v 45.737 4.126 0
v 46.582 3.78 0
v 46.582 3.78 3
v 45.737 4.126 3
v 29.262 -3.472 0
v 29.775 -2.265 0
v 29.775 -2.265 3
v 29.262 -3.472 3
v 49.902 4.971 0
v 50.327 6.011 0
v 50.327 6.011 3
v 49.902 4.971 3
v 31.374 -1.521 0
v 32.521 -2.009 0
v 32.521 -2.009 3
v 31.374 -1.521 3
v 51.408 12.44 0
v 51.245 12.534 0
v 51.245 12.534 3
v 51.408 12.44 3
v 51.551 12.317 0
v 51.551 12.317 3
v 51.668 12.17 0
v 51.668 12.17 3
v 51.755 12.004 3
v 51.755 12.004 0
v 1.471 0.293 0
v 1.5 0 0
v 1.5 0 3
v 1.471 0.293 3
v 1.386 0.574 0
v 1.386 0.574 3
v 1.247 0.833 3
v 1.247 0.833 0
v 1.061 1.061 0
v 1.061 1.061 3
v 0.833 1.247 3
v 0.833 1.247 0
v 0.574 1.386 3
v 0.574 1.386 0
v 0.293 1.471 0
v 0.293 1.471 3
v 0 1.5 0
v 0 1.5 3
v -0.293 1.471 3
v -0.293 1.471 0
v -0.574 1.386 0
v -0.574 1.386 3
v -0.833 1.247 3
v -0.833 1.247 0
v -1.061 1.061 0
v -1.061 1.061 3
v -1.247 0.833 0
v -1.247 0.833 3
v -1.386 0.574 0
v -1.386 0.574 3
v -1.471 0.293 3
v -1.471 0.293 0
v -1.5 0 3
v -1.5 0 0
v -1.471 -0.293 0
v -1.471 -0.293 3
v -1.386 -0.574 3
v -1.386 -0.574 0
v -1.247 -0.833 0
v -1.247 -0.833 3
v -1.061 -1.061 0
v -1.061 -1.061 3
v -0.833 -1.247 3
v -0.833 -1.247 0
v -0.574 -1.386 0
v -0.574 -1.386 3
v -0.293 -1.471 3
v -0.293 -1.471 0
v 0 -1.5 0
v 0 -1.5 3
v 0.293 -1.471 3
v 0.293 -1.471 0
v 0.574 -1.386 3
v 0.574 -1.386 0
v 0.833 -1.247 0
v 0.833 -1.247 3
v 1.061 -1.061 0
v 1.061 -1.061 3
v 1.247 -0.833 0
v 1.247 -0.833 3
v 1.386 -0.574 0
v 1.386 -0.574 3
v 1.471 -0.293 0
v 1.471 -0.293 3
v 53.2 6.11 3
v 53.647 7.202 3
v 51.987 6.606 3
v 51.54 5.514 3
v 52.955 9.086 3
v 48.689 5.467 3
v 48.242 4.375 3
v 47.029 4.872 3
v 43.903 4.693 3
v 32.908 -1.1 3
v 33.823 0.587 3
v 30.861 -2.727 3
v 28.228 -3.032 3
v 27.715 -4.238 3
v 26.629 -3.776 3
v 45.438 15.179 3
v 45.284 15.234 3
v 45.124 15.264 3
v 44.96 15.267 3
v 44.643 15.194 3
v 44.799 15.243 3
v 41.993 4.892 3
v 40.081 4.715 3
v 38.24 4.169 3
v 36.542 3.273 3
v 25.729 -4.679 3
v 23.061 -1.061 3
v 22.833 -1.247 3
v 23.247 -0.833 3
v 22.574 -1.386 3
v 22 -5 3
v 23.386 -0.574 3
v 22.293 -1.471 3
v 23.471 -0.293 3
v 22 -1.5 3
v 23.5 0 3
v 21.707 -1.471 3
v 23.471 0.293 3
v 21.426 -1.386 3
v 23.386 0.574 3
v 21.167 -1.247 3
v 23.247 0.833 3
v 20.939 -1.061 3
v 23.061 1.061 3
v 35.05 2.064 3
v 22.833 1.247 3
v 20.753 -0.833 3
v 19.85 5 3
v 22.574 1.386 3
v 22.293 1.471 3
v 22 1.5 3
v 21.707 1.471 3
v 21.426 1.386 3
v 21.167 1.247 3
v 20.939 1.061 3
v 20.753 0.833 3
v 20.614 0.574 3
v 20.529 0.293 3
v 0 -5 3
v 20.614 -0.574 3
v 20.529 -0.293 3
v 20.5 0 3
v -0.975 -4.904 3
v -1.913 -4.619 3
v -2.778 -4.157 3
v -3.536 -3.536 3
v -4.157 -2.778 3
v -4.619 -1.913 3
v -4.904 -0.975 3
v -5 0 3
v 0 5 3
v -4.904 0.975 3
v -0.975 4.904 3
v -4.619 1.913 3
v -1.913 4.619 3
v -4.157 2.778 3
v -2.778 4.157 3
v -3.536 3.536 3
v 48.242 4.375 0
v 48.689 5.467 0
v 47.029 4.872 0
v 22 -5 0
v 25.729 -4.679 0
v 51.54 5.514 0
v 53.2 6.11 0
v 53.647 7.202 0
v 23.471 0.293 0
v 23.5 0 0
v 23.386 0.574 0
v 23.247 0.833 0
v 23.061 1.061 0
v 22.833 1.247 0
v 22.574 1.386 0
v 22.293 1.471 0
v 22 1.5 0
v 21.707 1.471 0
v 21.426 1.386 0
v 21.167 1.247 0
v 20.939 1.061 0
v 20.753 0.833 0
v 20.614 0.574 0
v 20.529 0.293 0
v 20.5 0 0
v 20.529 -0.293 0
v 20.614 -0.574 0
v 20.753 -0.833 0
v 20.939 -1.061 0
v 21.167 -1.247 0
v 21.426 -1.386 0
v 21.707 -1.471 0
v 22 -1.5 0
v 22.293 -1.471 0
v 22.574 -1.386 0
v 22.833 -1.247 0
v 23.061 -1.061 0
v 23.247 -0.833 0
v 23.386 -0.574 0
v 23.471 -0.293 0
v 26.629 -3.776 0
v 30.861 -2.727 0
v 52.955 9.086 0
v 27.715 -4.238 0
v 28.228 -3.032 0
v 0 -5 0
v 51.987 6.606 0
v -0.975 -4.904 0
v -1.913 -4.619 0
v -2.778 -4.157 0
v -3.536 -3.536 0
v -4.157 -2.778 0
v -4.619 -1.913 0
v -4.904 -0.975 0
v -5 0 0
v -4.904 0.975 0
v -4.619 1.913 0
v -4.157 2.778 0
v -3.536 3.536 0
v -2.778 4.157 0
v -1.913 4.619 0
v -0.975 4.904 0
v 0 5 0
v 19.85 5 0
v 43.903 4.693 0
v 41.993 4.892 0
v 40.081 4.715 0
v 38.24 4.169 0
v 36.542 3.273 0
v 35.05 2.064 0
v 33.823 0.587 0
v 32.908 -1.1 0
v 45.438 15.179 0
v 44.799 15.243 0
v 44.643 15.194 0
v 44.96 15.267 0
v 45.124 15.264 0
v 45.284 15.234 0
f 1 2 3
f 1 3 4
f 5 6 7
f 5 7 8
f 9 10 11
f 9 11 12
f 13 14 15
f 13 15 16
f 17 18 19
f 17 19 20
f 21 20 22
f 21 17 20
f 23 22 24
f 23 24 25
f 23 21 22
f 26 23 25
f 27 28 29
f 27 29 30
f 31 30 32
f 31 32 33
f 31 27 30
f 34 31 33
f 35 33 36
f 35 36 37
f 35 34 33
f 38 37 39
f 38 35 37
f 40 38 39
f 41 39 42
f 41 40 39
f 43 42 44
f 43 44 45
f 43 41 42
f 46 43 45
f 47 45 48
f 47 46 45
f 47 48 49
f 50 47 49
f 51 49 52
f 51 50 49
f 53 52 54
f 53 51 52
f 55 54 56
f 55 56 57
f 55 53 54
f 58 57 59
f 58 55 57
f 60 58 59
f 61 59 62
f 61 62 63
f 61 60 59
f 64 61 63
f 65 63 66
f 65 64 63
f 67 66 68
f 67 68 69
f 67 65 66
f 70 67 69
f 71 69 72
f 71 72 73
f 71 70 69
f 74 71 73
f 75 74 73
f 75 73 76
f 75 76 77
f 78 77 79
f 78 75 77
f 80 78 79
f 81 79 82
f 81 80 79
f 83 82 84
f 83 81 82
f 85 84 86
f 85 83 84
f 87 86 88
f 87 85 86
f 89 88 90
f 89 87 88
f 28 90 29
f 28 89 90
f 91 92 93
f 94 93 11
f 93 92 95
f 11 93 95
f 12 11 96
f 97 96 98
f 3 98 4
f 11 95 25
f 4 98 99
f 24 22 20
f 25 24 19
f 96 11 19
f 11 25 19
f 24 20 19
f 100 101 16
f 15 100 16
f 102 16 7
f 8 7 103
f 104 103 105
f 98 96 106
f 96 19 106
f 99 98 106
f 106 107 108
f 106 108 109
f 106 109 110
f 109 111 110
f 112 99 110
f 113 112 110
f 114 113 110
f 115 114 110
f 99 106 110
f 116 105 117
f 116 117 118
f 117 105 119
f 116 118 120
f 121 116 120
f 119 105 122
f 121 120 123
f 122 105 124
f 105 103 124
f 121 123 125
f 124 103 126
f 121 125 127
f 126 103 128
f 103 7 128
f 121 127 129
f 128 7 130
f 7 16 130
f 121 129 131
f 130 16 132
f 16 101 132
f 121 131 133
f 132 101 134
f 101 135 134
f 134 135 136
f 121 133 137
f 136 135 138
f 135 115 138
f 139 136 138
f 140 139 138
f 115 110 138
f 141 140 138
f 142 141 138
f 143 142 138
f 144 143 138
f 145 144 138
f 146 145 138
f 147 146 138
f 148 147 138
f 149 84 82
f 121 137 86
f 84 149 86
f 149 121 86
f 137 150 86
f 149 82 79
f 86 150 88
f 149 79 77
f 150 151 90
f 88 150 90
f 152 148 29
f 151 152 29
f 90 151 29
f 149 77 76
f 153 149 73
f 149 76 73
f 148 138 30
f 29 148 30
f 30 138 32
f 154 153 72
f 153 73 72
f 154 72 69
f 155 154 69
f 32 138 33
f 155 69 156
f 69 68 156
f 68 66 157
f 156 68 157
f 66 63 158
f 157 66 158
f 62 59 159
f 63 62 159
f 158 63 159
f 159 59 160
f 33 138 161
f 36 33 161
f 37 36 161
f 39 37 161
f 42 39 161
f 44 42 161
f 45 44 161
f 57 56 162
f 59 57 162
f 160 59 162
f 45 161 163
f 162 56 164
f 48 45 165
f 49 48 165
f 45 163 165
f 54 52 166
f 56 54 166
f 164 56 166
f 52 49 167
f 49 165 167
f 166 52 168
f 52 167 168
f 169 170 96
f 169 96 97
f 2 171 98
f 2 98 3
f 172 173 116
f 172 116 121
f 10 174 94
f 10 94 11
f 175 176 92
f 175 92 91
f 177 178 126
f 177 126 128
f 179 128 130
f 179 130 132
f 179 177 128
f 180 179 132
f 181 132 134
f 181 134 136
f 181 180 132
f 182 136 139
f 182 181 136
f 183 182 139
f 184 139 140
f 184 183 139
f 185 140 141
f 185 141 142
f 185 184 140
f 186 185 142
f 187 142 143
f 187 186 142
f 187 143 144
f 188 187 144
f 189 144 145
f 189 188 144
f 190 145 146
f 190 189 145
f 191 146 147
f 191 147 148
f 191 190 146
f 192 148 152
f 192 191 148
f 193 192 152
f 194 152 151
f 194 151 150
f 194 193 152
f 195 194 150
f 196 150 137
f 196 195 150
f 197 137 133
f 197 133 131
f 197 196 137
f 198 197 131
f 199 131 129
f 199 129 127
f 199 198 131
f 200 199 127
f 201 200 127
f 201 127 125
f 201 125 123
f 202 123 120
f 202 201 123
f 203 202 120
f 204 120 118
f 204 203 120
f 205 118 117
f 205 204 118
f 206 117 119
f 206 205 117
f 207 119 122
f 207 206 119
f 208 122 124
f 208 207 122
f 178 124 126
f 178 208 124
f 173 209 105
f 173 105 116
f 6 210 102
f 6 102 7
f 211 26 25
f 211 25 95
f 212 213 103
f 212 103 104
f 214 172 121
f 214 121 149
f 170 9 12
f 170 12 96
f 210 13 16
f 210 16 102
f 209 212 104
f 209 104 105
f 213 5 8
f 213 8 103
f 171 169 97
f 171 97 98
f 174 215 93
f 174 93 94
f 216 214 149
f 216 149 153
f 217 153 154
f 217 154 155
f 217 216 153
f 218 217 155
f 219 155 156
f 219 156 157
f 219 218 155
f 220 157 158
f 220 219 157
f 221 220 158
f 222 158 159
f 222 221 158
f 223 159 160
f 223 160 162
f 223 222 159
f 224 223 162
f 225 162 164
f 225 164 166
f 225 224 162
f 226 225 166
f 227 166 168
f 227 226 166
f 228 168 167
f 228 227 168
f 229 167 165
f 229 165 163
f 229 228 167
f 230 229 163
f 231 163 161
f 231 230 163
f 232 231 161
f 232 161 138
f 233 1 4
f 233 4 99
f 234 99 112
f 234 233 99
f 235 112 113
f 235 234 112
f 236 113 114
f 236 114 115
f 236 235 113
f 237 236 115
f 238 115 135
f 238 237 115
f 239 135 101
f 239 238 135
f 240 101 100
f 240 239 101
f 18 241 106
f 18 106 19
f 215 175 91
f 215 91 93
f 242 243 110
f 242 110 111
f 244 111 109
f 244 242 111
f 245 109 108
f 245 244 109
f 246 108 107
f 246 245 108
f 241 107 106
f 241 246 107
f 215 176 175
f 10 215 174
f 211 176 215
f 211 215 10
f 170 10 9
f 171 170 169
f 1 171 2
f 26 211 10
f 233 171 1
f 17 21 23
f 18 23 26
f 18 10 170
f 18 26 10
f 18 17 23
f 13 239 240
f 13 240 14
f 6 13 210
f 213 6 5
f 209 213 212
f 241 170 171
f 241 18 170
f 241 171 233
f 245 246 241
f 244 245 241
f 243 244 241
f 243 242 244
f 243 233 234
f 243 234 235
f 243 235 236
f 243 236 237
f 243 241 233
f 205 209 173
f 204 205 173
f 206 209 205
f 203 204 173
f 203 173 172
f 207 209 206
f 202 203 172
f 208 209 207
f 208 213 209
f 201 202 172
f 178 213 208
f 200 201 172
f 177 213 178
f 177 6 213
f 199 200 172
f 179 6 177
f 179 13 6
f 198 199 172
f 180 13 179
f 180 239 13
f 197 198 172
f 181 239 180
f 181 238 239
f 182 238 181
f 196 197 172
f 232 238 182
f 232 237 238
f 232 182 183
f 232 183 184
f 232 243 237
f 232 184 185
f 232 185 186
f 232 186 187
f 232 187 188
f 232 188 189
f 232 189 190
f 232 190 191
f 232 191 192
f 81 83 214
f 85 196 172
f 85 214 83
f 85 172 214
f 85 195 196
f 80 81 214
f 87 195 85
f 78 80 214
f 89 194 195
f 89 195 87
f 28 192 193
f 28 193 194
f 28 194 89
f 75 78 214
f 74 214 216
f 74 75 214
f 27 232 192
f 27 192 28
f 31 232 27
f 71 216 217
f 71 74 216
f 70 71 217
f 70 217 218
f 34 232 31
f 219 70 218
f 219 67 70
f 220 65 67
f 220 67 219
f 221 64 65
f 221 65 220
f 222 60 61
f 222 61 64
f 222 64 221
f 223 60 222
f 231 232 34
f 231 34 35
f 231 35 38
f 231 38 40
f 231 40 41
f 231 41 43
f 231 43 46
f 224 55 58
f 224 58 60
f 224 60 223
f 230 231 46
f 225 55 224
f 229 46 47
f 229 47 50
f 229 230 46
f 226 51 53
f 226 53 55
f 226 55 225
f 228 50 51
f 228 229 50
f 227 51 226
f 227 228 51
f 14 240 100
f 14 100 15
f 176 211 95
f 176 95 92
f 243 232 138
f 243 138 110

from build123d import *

# Parameters (mm, degrees)
SKETCH1_R           = 1.5
BOSS_EXTRUDE1_DEPTH = 3


with BuildPart() as part:
    # Sketch1 → Boss-Extrude1 (new body)
    with BuildSketch(Plane.XY):
        with BuildLine():
            Line((0, 5), (19.85, 5))
            Line((19.85, 5), (44.643069029, 15.193663072))
            ThreePointArc((44.643069029, 15.193663072), (45.042006379, 15.268610471), (45.43786686, 15.178818479))
            Line((45.43786686, 15.178818479), (51.245085043, 12.533540635))
            ThreePointArc((51.245085043, 12.533540635), (51.550738574, 12.317286013), (51.755428853, 12.003770413))
            Line((51.755428853, 12.003770413), (52.954960556, 9.086264498))
            Line((52.954960556, 9.086264498), (53.647413738, 7.201821951))
            Line((53.647413738, 7.201821951), (53.200417763, 6.109762155))
            Line((53.200417763, 6.109762155), (51.987413738, 6.606262365))
            Line((51.987413738, 6.606262365), (51.540417763, 5.514202569))
            Line((51.540417763, 5.514202569), (50.327413738, 6.010702778))
            Line((50.327413738, 6.010702778), (49.901790908, 4.970859901))
            Line((49.901790908, 4.970859901), (48.688786884, 5.467360111))
            Line((48.688786884, 5.467360111), (48.241790908, 4.375300315))
            Line((48.241790908, 4.375300315), (47.028786884, 4.871800524))
            Line((47.028786884, 4.871800524), (46.581790908, 3.779740729))
            Line((46.581790908, 3.779740729), (45.736822648, 4.125598541))
            ThreePointArc((45.736822648, 4.125598541), (38.240209852, 4.168619257), (32.907533275, -1.100499713))
            Line((32.907533275, -1.100499713), (32.521118505, -2.009071771))
            Line((32.521118505, -2.009071771), (31.373673566, -1.521064608))
            Line((31.373673566, -1.521064608), (30.860706561, -2.727197301))
            Line((30.860706561, -2.727197301), (29.774832981, -2.265376374))
            Line((29.774832981, -2.265376374), (29.261865976, -3.471509067))
            Line((29.261865976, -3.471509067), (28.227913521, -3.031770141))
            Line((28.227913521, -3.031770141), (27.714946516, -4.237902834))
            Line((27.714946516, -4.237902834), (26.629072936, -3.776081907))
            Line((26.629072936, -3.776081907), (25.729131342, -4.679393535))
            Line((25.729131342, -4.679393535), (22, -5))
            Line((22, -5), (0, -5))
            ThreePointArc((0, -5), (-5, 0), (0, 5))
        make_face()
        Circle(SKETCH1_R, mode=Mode.SUBTRACT)
        with Locations((22, 0)):
            Circle(SKETCH1_R, mode=Mode.SUBTRACT)
    extrude(amount=BOSS_EXTRUDE1_DEPTH)


solid = part.part
